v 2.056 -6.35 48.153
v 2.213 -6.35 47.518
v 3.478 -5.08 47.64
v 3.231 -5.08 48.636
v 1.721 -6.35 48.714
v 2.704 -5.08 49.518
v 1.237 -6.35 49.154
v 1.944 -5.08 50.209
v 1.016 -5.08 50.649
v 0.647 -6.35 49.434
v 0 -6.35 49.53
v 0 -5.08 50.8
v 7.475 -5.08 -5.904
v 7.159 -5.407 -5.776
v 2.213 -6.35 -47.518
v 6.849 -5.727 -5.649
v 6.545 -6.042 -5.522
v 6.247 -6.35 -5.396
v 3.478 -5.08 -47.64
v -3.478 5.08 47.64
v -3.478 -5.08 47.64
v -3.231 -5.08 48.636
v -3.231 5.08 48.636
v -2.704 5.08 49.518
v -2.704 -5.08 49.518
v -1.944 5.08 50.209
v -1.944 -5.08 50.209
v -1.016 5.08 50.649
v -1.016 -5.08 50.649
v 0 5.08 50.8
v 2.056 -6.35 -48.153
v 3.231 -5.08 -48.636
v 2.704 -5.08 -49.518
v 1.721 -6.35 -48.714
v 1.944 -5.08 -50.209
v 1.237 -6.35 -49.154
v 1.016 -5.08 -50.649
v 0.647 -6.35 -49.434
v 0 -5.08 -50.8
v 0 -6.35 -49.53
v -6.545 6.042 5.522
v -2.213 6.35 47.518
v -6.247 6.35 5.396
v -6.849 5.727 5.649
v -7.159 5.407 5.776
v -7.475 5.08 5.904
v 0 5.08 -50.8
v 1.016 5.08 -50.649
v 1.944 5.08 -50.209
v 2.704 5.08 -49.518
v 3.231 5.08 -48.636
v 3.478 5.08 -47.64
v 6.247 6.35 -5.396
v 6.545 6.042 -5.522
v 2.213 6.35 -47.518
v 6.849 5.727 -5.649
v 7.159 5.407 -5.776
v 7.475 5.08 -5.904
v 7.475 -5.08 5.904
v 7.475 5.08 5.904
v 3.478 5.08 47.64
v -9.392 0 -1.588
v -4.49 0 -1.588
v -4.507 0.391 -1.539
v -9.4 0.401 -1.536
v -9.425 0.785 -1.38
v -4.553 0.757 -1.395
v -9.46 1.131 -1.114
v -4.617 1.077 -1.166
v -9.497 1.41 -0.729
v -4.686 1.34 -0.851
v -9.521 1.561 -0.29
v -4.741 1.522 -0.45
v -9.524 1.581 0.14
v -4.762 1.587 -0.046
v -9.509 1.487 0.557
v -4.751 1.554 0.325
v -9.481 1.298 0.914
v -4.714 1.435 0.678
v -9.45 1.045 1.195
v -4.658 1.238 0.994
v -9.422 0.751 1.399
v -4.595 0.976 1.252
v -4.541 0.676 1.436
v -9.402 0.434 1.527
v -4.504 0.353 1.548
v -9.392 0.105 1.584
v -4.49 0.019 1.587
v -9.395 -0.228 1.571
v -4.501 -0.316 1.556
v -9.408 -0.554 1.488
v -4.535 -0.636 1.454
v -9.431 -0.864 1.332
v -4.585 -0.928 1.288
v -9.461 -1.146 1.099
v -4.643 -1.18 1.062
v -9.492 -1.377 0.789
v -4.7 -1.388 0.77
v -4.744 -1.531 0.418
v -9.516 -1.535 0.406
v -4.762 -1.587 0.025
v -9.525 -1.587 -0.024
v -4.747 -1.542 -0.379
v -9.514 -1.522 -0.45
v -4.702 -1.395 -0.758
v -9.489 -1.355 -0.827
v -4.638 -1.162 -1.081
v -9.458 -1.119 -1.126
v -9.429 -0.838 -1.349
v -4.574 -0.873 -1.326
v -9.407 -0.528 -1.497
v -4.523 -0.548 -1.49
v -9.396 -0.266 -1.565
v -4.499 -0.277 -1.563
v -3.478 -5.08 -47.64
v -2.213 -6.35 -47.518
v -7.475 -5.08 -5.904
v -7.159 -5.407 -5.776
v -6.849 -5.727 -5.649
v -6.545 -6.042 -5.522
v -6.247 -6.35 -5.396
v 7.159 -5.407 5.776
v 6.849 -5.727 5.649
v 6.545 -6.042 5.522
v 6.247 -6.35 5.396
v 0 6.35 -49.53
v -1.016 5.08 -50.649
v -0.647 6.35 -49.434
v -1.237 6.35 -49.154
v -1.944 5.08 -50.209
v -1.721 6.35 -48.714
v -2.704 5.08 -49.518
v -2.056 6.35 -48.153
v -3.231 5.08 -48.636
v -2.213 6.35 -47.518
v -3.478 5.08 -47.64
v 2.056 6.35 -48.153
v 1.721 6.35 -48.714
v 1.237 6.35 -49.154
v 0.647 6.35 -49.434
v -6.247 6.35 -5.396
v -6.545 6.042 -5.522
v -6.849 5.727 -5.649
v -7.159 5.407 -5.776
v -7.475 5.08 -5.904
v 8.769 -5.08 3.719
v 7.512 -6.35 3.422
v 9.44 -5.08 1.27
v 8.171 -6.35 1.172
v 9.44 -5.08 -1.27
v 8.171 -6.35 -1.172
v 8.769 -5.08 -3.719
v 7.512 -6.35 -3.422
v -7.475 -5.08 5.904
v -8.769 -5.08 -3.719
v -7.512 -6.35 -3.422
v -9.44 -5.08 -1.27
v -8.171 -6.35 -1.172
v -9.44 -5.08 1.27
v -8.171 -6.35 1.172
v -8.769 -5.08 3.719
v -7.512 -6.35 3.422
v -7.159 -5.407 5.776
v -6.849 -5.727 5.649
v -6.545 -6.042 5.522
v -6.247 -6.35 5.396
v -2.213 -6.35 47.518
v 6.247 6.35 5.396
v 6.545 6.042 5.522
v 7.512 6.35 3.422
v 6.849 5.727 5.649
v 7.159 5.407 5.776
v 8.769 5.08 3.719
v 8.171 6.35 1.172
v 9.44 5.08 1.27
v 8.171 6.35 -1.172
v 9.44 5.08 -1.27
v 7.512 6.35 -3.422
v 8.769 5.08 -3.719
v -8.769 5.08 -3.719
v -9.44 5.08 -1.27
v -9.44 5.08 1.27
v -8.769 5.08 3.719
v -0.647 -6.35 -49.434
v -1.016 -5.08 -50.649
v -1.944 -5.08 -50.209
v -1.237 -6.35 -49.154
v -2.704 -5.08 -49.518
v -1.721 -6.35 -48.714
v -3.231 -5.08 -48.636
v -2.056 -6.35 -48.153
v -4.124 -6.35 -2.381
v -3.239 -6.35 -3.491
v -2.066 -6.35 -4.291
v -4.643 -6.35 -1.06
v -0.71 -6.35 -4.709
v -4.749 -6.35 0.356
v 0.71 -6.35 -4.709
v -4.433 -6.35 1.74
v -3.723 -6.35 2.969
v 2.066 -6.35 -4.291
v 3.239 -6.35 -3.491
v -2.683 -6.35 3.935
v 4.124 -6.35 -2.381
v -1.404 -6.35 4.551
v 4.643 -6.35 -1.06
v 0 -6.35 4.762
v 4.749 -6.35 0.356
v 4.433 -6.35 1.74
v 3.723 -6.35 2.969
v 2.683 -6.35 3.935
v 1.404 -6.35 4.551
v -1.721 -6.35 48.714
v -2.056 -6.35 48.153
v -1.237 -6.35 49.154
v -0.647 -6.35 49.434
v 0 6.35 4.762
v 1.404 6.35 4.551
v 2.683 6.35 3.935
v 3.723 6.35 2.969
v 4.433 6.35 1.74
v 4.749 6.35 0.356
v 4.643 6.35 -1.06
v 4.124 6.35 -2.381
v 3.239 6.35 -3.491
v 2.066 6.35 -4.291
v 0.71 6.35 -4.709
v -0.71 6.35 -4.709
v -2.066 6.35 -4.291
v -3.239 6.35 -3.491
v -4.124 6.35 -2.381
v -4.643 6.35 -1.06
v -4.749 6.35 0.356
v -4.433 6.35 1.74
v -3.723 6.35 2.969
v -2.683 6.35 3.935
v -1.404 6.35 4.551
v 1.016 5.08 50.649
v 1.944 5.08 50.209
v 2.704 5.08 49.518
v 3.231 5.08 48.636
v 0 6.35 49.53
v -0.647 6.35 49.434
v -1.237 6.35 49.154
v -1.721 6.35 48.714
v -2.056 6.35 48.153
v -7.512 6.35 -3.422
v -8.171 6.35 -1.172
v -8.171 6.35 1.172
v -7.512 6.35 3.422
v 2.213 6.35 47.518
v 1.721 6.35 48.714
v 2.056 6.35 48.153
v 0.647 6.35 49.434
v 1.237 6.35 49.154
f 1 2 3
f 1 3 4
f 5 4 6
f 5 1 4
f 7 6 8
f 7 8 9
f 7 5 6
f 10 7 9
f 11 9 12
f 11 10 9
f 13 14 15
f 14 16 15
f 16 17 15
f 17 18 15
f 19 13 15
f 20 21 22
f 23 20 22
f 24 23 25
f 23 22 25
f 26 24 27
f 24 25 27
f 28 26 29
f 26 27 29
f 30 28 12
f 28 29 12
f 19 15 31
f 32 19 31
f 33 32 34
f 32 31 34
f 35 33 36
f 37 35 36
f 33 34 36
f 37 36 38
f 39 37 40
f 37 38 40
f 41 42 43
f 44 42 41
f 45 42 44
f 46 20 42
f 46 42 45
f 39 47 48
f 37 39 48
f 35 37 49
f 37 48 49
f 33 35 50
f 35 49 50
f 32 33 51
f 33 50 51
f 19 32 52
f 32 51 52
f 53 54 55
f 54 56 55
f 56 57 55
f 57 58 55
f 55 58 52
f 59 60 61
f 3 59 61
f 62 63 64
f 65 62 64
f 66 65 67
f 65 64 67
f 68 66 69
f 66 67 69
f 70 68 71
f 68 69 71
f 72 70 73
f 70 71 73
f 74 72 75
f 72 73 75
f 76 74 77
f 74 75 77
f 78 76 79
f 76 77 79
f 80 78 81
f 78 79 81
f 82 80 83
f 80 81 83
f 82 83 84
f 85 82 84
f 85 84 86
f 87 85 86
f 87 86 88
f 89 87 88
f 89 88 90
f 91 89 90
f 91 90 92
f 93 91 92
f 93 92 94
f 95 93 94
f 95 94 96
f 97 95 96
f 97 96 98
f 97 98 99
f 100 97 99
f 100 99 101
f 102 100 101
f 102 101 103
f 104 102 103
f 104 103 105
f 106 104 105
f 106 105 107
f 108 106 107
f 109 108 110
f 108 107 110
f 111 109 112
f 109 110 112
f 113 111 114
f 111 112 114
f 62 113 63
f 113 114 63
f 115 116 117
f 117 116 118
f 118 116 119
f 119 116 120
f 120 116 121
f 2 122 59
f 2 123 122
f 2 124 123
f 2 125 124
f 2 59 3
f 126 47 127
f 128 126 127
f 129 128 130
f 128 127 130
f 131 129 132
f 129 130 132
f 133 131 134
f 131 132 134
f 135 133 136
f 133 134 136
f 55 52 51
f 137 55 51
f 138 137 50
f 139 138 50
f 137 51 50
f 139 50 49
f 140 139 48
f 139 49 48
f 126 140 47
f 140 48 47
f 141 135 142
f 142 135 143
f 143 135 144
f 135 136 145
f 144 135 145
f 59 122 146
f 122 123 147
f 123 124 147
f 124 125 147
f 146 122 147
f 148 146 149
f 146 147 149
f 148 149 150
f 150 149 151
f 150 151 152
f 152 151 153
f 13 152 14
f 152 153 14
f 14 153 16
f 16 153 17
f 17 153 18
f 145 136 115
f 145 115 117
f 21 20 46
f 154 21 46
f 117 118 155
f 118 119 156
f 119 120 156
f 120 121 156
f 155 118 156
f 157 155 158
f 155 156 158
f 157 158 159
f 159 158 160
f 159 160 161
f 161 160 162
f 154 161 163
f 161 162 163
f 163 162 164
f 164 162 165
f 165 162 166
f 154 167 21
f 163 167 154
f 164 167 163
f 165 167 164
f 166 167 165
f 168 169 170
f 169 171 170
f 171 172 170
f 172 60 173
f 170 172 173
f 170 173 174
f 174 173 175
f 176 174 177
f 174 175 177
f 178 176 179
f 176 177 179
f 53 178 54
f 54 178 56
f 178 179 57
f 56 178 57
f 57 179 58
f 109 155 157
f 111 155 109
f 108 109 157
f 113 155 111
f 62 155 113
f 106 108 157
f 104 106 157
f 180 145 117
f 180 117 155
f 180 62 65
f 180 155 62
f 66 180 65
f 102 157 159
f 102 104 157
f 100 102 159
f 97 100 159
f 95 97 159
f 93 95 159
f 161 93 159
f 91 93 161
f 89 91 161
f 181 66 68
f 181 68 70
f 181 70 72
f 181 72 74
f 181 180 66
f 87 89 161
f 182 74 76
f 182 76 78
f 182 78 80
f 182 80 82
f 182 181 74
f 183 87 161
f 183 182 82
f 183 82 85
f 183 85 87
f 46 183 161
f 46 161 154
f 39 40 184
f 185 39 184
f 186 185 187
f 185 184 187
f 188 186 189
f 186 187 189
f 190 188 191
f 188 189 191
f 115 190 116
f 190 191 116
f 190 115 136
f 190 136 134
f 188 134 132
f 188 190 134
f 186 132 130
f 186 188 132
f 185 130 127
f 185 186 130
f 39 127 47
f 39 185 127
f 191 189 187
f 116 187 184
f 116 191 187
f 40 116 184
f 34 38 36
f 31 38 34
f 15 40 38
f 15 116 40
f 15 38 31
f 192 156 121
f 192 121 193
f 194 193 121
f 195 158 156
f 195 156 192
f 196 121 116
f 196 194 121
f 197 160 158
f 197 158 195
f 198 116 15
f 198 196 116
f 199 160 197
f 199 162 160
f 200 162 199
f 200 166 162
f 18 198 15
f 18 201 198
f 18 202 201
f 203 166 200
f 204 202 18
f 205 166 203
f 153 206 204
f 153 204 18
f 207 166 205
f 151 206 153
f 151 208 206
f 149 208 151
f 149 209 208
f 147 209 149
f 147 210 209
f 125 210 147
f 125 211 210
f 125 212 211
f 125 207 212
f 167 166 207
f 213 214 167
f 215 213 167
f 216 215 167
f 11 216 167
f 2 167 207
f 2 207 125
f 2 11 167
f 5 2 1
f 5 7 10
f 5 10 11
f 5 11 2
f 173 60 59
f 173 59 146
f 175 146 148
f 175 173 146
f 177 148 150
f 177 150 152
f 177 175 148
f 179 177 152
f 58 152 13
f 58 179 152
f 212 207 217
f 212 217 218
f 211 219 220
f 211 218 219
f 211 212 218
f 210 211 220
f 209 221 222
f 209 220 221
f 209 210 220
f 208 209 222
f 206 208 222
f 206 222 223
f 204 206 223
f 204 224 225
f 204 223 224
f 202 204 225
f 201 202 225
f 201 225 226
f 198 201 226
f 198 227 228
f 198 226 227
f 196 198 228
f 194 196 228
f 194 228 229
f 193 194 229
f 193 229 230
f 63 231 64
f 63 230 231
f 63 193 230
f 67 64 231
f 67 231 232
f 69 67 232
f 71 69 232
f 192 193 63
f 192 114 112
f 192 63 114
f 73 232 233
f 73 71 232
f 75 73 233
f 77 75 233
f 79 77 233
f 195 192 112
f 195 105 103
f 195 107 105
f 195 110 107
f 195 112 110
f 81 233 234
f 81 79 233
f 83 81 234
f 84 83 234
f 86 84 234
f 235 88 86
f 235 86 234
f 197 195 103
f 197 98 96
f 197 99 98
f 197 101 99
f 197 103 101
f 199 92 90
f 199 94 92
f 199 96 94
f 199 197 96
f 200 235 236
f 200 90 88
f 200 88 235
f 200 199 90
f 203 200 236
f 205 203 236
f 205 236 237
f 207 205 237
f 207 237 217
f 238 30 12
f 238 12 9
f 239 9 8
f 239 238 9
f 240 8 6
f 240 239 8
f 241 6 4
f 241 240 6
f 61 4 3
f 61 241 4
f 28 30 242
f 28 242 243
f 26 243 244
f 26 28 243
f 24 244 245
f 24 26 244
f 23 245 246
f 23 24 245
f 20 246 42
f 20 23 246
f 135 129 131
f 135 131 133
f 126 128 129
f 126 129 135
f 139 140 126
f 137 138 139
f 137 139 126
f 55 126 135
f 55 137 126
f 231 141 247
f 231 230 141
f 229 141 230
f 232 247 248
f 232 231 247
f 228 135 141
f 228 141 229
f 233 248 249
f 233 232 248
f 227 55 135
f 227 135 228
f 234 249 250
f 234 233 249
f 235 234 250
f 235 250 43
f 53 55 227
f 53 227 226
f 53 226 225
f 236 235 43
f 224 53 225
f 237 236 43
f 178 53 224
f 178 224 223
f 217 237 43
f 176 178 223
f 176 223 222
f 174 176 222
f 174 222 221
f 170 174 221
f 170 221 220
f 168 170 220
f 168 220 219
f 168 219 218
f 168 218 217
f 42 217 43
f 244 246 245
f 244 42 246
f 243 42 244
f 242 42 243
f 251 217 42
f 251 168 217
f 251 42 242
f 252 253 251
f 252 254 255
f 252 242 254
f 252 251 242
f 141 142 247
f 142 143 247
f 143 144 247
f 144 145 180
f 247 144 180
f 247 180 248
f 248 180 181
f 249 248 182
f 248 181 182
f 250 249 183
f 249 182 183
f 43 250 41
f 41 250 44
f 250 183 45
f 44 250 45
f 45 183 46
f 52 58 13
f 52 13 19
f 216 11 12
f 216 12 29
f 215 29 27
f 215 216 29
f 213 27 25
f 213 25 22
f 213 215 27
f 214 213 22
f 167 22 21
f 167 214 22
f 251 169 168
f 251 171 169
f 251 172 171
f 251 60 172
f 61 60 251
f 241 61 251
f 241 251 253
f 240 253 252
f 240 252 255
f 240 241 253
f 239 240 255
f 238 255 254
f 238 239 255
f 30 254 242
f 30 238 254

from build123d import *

# Parameters (mm, degrees)
SKETCH1_R               = 9.525
BOSS_EXTRUDE1_DEPTH     = 6.35
BOSS_EXTRUDE2_DEPTH     = 6.35
FILLET1_R               = 3.49359
FILLET1_OF_MIRROR2_R    = 3.49359
CHAMFER1_SIZE           = 1.27
CUT_EXTRUDE1_DEPTH      = 53.073871807
CUT_EXTRUDE1_DEPTH_BACK = 53.073871807
SKETCH1_3_R             = 4.7625
SKETCH3_R               = 1.5875
CUT_EXTRUDE2_DEPTH      = 53.073871807


with BuildPart() as part:
    # Sketch1 → Boss-Extrude1 (new, symmetric)
    with BuildSketch(Plane(origin=(0, 0, 0), x_dir=(1, 0, 0), z_dir=(0, 1, 0))):
        with Locations(Location((0, 0, 0), (0, 0, 270))):
            Circle(SKETCH1_R)
    extrude(amount=BOSS_EXTRUDE1_DEPTH, both=True)

    # Sketch2 → Boss-Extrude2 (add, symmetric)
    with BuildSketch(Plane(origin=(0, 0, 0), x_dir=(1, 0, 0), z_dir=(0, 1, 0))):
        Polygon((-8.040009509, 0), (8.040009509, 0), (3.175, 50.8), (-3.175, 50.8), align=None)
    boss_extrude2 = extrude(amount=BOSS_EXTRUDE2_DEPTH, both=True)

    # Fillet1
    fillet1_edges = [part.edges().sort_by_distance(p)[0] for p in [
        (-3.175, 0, -50.8),
        (3.175, 0, -50.8),
    ]]
    fillet(fillet1_edges, radius=FILLET1_R - 0.0001)  # a hair under: the kernel refuses the full size

    # Mirror2: Boss-Extrude2 across plane
    add(boss_extrude2.mirror(Plane.XY))

    # Fillet1 of Mirror2
    fillet1_of_mirror2_edges = [part.edges().sort_by_distance(p)[0] for p in [
        (-3.175, 0, 50.8),
        (3.175, 0, 50.8),
    ]]
    fillet(fillet1_of_mirror2_edges, radius=FILLET1_OF_MIRROR2_R - 0.0001)  # a hair under: the kernel refuses the full size

    # Chamfer1
    chamfer1_edges = [part.edges().sort_by_distance(p)[0] for p in [
        (5.476138131, -6.35, -26.771718685),
        (5.476138131, 6.35, -26.771718685),
        (-5.476138131, -6.35, -26.771718685),
        (-5.476138131, 6.35, -26.771718685),
        (0, -6.35, -50.8),
        (0, 6.35, -50.8),
        (9.525, -6.35, 0),
        (9.525, 6.35, 0),
        (5.476138131, 6.35, 26.771718685),
        (5.476138131, -6.35, 26.771718685),
        (-9.525, -6.35, 0),
        (-5.476138131, -6.35, 26.771718685),
        (-5.476138131, 6.35, 26.771718685),
        (0, 6.35, 50.8),
        (0, -6.35, 50.8),
        (-9.525, 6.35, 0),
    ]]
    chamfer(chamfer1_edges, length=CHAMFER1_SIZE)

    # Sketch1<3> → Cut-Extrude1 (cut, two sides: drawn at the far end of the back side and taken through both)
    with BuildSketch(Plane(origin=(0, 0, 0), x_dir=(1, 0, 0), z_dir=(0, 1, 0)).offset(-CUT_EXTRUDE1_DEPTH_BACK)):
        with Locations(Location((0, 0, 0), (0, 0, 270))):
            Circle(SKETCH1_3_R)
    extrude(amount=CUT_EXTRUDE1_DEPTH + CUT_EXTRUDE1_DEPTH_BACK, mode=Mode.SUBTRACT)

    # Sketch3 → Cut-Extrude2 (cut, through all)
    with BuildSketch(Plane(origin=(0, 0, 0), x_dir=(0, 0, -1), z_dir=(1, 0, 0))):
        Circle(SKETCH3_R)
    extrude(amount=-CUT_EXTRUDE2_DEPTH, mode=Mode.SUBTRACT)


solid = part.part
